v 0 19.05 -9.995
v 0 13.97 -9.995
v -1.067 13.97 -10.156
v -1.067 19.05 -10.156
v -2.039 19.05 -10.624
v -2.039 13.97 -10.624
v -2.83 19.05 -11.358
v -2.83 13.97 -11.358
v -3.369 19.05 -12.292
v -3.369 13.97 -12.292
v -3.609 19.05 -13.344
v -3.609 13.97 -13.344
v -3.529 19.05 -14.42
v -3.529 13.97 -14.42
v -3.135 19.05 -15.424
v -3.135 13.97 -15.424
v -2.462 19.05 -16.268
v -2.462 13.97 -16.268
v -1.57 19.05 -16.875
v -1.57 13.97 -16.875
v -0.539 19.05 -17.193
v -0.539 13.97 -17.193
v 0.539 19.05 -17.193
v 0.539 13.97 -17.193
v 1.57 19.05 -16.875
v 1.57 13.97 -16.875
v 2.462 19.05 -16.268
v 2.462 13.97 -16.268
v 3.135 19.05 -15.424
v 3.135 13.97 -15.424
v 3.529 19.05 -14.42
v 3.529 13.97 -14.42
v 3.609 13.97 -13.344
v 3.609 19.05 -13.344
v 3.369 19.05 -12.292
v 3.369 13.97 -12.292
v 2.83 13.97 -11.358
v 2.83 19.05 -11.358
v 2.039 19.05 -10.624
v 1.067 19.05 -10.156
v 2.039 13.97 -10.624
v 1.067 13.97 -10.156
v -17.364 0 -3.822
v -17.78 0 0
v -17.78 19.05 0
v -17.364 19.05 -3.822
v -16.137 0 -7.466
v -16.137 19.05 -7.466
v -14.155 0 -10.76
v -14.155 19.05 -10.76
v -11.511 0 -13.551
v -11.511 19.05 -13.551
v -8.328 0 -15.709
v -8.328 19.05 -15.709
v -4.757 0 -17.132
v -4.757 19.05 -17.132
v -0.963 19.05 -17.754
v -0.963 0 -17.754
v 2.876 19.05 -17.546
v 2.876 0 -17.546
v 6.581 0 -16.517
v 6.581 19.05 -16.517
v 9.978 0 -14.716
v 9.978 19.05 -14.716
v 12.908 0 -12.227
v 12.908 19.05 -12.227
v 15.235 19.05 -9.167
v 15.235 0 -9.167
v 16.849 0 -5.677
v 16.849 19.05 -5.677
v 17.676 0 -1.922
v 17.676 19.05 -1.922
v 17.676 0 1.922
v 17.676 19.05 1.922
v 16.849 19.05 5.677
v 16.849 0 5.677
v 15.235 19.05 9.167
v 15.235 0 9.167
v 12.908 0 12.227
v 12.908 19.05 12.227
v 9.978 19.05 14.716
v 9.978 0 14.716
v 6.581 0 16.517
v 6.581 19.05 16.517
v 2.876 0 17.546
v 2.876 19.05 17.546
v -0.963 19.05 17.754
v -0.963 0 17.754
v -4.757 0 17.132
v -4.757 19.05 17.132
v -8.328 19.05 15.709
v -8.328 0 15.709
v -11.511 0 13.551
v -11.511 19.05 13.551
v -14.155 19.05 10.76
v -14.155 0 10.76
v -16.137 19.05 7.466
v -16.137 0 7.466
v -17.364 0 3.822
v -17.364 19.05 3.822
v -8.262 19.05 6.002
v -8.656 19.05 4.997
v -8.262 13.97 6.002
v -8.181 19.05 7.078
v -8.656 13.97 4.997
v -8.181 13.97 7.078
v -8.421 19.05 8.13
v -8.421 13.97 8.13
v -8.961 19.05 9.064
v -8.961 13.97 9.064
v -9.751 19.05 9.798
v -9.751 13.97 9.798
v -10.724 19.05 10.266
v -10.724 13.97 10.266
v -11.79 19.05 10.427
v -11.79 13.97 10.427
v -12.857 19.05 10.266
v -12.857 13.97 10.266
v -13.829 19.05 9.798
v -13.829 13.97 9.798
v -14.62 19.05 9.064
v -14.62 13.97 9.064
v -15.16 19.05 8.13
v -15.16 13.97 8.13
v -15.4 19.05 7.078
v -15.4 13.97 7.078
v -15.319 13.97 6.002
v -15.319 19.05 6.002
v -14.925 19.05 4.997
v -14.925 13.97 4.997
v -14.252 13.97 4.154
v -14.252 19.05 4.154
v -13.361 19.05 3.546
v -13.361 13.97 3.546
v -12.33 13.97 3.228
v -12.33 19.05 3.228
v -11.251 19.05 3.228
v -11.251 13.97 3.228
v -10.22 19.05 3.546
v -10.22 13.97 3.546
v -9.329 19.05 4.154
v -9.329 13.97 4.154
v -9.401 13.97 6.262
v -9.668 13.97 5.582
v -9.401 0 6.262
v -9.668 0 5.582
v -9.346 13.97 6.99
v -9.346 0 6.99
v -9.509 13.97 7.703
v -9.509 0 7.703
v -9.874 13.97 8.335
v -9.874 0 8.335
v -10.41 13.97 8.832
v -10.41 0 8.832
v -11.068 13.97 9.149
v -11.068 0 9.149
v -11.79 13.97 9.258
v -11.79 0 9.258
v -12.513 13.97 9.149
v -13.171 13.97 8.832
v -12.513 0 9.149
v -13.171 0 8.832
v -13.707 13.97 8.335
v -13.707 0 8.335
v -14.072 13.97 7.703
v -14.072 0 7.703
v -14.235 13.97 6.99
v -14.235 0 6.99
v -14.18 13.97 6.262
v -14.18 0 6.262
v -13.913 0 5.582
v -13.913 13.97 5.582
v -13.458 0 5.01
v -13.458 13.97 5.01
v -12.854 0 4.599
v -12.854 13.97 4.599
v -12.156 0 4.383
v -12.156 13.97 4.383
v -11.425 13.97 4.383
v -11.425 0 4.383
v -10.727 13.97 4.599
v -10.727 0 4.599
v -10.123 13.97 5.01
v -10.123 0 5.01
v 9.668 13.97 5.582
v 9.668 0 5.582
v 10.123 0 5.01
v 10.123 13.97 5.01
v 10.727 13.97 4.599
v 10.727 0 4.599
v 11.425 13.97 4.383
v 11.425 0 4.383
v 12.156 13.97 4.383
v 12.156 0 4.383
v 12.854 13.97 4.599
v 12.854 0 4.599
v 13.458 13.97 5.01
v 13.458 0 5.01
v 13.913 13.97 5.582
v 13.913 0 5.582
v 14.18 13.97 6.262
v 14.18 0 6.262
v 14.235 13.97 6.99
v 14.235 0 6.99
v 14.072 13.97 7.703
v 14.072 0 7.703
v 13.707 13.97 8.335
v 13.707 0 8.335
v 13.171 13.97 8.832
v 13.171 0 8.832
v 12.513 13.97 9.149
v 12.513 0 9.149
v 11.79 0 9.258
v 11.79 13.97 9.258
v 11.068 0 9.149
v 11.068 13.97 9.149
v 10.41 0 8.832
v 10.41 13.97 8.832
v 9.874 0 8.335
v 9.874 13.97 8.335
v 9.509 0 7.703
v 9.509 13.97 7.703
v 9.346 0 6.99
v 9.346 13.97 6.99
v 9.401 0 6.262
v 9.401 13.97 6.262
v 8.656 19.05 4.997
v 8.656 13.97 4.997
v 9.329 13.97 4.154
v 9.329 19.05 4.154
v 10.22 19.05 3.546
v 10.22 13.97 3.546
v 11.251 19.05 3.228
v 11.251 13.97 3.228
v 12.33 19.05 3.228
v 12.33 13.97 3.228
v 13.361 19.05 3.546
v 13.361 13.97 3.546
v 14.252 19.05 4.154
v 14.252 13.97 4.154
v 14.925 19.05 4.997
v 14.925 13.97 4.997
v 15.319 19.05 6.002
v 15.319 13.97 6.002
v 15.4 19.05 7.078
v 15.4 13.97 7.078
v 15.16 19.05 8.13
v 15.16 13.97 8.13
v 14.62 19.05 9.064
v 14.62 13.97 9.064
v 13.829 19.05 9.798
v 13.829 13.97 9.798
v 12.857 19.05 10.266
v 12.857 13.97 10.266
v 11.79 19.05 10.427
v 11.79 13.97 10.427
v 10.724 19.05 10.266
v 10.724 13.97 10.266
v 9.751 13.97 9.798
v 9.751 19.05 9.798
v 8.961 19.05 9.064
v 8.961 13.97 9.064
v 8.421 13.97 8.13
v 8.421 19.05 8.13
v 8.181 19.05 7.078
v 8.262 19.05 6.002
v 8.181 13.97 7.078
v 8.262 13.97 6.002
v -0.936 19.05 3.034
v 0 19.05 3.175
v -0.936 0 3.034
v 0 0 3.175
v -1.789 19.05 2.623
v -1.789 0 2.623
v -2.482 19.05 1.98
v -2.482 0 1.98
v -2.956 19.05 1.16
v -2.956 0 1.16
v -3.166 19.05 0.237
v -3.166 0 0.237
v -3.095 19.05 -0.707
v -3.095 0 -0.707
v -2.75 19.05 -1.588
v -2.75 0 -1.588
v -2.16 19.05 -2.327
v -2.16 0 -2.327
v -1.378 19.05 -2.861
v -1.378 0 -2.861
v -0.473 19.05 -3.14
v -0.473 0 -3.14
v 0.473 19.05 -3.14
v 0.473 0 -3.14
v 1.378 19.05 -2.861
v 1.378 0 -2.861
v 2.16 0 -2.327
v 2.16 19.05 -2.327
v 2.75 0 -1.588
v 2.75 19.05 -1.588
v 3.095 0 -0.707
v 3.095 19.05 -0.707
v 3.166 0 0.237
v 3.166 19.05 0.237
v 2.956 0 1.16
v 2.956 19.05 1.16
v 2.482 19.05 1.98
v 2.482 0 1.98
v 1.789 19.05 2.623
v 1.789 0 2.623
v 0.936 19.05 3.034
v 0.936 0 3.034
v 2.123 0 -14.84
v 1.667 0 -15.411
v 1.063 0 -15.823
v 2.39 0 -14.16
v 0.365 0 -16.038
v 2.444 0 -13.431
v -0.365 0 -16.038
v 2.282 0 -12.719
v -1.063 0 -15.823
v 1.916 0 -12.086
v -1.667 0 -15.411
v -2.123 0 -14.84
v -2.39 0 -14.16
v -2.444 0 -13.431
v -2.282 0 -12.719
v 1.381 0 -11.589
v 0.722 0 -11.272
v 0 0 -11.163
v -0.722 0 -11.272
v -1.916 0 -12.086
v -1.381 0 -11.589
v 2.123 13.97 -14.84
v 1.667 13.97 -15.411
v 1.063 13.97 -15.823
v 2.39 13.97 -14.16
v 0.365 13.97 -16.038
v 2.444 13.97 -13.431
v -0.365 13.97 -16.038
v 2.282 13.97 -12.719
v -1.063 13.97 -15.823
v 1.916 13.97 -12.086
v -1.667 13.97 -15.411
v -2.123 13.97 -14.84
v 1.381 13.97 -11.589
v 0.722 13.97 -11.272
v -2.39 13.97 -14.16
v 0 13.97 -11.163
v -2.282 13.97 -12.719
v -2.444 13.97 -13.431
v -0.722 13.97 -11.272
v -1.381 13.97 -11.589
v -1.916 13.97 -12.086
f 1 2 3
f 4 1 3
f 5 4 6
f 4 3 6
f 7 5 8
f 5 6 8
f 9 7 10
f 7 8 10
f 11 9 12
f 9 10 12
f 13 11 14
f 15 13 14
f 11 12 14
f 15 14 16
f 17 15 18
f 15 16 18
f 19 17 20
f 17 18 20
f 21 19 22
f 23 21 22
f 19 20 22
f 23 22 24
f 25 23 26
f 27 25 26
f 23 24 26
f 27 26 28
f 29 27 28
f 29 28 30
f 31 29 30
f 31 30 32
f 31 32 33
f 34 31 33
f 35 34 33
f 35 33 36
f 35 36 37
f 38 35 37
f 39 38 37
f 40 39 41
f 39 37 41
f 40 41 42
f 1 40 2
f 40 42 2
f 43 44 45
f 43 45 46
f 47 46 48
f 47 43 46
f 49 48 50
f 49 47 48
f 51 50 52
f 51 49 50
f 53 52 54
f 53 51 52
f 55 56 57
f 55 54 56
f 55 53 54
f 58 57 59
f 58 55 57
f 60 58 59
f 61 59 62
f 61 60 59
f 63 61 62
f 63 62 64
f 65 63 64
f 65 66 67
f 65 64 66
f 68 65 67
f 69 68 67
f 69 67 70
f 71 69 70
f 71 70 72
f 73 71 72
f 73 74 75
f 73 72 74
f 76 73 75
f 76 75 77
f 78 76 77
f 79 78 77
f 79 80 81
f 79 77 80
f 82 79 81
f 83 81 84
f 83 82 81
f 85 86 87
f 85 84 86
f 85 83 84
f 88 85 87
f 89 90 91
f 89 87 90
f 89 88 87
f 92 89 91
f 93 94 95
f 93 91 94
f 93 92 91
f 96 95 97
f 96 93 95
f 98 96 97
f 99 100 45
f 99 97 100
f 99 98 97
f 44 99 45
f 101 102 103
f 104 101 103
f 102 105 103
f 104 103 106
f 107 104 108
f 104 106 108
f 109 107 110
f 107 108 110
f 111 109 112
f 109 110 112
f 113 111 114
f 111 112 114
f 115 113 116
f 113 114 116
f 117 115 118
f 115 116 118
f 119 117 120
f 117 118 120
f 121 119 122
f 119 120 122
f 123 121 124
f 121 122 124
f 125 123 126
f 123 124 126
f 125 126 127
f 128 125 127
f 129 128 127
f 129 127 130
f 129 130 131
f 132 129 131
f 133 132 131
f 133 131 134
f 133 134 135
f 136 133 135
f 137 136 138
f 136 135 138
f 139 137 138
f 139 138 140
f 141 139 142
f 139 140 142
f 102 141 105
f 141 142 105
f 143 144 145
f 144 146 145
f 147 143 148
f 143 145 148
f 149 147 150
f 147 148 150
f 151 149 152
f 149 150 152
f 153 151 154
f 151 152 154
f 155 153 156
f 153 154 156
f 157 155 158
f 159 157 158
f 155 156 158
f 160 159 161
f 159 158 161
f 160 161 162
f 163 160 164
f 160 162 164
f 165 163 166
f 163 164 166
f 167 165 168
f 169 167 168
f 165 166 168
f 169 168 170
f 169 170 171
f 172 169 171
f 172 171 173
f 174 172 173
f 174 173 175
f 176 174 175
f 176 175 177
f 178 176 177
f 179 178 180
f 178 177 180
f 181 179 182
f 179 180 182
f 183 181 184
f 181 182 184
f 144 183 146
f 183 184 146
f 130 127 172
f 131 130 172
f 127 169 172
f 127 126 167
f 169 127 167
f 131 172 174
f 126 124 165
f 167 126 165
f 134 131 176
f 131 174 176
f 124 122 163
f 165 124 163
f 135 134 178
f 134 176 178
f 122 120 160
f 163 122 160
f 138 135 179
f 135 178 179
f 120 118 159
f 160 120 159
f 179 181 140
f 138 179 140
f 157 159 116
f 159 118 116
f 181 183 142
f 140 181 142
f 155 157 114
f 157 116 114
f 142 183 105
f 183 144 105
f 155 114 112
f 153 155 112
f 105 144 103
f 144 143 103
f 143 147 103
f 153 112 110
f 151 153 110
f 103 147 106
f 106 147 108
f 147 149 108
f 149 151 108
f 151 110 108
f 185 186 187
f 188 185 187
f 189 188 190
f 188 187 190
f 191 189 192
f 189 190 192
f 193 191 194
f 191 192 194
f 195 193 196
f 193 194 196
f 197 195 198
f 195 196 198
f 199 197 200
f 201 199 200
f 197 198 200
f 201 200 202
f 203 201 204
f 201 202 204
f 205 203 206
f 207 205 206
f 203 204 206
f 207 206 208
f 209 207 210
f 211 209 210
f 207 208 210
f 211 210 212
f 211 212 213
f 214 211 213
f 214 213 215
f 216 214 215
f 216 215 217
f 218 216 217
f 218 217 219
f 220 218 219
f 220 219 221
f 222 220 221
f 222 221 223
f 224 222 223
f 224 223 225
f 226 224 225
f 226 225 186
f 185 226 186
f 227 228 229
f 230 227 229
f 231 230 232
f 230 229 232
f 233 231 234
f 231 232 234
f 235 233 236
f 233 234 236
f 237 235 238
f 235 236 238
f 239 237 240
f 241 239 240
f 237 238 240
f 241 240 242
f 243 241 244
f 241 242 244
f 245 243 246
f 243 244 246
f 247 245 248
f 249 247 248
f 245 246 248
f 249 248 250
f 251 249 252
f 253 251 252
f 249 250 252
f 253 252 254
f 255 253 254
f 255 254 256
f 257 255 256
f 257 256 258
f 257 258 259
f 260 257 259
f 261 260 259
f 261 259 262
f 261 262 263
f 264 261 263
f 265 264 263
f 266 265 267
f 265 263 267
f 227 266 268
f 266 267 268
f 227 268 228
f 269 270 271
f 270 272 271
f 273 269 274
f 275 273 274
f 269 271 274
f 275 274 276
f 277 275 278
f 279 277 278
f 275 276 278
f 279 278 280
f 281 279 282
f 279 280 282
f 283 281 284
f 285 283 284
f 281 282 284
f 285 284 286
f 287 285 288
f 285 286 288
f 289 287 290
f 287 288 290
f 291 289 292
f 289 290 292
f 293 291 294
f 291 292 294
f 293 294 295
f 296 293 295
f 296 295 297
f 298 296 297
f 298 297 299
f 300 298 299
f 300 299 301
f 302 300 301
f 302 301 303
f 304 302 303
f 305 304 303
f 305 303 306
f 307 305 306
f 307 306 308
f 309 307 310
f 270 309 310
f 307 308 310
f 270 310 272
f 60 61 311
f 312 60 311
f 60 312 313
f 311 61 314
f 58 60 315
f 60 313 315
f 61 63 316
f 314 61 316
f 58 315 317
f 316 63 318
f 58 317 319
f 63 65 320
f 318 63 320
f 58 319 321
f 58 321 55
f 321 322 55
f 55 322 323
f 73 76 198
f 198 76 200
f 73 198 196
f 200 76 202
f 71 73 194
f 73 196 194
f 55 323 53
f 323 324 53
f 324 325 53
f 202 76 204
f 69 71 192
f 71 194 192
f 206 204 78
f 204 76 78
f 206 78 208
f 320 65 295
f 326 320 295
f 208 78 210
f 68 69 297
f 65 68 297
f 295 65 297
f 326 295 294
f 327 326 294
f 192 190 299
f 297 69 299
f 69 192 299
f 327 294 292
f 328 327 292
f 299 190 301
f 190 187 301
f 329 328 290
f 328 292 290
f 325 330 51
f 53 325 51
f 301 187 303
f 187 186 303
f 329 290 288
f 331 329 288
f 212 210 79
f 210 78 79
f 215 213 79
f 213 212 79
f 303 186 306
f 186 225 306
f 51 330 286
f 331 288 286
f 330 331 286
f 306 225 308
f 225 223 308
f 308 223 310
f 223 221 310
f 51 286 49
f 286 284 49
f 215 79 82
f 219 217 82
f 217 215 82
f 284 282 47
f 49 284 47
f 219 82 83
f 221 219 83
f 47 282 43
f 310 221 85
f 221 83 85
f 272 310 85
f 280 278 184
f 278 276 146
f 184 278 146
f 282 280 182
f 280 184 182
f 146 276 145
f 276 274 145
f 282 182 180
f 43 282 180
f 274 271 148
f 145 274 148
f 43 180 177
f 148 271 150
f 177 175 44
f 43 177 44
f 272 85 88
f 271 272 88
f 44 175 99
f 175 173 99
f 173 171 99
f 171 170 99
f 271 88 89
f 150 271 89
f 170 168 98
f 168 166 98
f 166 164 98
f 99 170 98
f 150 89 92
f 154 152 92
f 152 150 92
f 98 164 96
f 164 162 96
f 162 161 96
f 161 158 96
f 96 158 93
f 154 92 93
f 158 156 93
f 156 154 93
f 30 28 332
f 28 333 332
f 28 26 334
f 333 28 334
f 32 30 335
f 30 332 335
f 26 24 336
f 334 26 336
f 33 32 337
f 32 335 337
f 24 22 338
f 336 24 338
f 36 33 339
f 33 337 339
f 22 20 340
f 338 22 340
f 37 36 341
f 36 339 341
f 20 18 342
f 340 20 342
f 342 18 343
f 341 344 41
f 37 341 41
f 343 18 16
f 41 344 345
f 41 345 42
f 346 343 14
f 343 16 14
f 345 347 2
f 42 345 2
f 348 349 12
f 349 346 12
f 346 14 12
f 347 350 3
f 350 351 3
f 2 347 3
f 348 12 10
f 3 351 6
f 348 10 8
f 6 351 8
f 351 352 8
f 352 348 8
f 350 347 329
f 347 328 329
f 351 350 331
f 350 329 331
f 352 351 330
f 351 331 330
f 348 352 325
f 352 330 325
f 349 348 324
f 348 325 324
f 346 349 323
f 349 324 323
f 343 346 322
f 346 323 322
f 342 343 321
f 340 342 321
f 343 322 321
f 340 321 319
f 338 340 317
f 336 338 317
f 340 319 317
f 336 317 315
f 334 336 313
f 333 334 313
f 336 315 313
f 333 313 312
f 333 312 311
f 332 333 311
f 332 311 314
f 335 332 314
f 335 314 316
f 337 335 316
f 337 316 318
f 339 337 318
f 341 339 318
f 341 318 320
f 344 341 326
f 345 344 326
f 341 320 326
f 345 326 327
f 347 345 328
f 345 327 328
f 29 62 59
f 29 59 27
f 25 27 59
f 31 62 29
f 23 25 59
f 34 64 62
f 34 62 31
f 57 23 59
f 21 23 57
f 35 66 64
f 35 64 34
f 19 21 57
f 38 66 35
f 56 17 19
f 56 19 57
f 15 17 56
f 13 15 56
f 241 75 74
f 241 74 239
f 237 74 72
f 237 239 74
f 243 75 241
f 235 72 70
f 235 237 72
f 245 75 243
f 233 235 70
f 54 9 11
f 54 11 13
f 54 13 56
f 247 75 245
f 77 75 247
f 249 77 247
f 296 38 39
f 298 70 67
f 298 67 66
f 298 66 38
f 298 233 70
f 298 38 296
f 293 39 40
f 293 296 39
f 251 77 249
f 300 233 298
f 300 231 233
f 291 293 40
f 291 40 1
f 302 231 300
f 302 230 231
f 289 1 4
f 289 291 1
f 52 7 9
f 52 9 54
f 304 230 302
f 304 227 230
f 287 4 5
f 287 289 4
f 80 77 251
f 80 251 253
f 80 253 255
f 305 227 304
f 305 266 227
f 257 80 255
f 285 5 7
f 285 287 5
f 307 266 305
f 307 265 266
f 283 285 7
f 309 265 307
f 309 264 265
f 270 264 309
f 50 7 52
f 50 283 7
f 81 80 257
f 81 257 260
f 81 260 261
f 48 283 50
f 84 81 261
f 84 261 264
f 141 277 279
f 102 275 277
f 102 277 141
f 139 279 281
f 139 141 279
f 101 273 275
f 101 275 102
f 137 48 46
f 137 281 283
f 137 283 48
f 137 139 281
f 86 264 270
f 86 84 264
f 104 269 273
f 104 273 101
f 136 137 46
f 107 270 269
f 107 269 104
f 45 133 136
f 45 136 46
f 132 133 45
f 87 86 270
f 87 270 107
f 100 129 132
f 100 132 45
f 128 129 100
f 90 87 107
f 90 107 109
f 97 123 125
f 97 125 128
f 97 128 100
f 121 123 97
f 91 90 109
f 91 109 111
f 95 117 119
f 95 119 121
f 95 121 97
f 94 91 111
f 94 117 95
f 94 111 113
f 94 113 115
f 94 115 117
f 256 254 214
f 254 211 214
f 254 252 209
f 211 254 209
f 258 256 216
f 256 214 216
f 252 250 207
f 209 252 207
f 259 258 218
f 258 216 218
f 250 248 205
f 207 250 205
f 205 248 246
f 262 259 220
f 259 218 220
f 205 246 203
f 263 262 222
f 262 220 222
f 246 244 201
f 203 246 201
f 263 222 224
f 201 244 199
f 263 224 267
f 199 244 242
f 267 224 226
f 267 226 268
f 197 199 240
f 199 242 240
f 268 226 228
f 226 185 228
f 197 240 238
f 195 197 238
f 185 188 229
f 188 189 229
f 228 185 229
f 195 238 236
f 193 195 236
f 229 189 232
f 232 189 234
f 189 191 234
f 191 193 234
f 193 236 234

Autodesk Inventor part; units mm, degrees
ref_plane "YZ Plane" through (0, 0, 0) normal (1, 0, 0) x (0, 1, 0)
ref_plane "XZ Plane" through (0, 0, 0) normal (0, 1, 0) x (-1, 0, 0)
ref_plane "XY Plane" through (0, 0, 0) normal (0, 0, 1) x (1, 0, 0)
sketch "Sketch1" plane through (0, 0, 0) normal (0, 1, 0) x (-1, 0, 0)
  line L0 (0, 0) -> (13.6144, 0)
  circle A0 centre (0, 0) radius 17.78
  dimension "d0" = 13.6144
  dimension "d1" = 35.56
extrude "Extrusion1" add sketch "Sketch1" along normal blind 19.05
sketch "Sketch3" plane through (0, 19.05, 0) normal (0, 1, 0) x (1, 0, 0)
  line L0 (0, 0) -> (0, 13.6144)
  line L1 (0, 0) -> (13.6144, 0) construction
  dimension "d4" = 13.6144
  dimension "d5" = 90
hole "Hole1" at (0, 19.05, -13.6144) direction (0, -1, 0) diameter 4.9022 end through all counterbore diameter 7.239 counterbore depth 5.08
sketch "Sketch4" plane through (0, 0, 0) normal (0, -1, 0) x (1, 0, 0)
  circle A0 centre (0, -13.6144) radius 2.4511 projected
  line L0 (0, 0) -> (0, -13.6144)
hole "Hole2" at (0, 0, -13.6144) direction (0, 1, 0) diameter 4.9022 depth 6.35
pattern_circular "Circular Pattern1" count 3 over 360 about axis through (0, 0, 0) along (0, 1, 0) of "Hole1", "Hole2"
sketch "Sketch6" plane through (0, 19.05, 0) normal (0, 1, 0) x (1, 0, 0)
  point P0 (0, 0)
  point P1 (0, 0)
hole "Hole3" at (0, 19.05, 0) direction (0, -1, 0) diameter 6.35 end through all
sketch "Sketch14" plane through (0, 0, 0) normal (0, -1, 0) x (1, 0, 0)
  circle A0 centre (11.7904, 6.8072) radius 2.4511 projected
  circle A1 centre (0, -13.6144) radius 2.4511 projected
  circle A2 centre (-11.7904, 6.8072) radius 2.4511 projected
  line L0 (11.7904, 6.8072) -> (0, 0)
  line L1 (0, 0) -> (11.7904, 6.8072)
  line L2 (-11.7904, 6.8072) -> (0, -13.6144)
  line L3 (0, -13.6144) -> (11.7904, 6.8072)
  line L4 (-11.7904, 6.8072) -> (11.7904, 6.8072)
  line L5 (-11.7904, 6.8072) -> (5.8952, -3.4036)
  line L6 (0, -13.6144) -> (0, 6.8072)
  line L7 (11.7904, 6.8072) -> (-5.8952, -3.4036)
  circle A3 centre (11.7904, 6.8072) radius 2.4511 projected
  line L8 (13.9131, 8.0328) -> (15.3979, 8.89)
  circle A4 centre (0, 0) radius 17.78 projected
  circle A5 centre (0, 0) radius 16.0655
properties part number "tablebackup"
